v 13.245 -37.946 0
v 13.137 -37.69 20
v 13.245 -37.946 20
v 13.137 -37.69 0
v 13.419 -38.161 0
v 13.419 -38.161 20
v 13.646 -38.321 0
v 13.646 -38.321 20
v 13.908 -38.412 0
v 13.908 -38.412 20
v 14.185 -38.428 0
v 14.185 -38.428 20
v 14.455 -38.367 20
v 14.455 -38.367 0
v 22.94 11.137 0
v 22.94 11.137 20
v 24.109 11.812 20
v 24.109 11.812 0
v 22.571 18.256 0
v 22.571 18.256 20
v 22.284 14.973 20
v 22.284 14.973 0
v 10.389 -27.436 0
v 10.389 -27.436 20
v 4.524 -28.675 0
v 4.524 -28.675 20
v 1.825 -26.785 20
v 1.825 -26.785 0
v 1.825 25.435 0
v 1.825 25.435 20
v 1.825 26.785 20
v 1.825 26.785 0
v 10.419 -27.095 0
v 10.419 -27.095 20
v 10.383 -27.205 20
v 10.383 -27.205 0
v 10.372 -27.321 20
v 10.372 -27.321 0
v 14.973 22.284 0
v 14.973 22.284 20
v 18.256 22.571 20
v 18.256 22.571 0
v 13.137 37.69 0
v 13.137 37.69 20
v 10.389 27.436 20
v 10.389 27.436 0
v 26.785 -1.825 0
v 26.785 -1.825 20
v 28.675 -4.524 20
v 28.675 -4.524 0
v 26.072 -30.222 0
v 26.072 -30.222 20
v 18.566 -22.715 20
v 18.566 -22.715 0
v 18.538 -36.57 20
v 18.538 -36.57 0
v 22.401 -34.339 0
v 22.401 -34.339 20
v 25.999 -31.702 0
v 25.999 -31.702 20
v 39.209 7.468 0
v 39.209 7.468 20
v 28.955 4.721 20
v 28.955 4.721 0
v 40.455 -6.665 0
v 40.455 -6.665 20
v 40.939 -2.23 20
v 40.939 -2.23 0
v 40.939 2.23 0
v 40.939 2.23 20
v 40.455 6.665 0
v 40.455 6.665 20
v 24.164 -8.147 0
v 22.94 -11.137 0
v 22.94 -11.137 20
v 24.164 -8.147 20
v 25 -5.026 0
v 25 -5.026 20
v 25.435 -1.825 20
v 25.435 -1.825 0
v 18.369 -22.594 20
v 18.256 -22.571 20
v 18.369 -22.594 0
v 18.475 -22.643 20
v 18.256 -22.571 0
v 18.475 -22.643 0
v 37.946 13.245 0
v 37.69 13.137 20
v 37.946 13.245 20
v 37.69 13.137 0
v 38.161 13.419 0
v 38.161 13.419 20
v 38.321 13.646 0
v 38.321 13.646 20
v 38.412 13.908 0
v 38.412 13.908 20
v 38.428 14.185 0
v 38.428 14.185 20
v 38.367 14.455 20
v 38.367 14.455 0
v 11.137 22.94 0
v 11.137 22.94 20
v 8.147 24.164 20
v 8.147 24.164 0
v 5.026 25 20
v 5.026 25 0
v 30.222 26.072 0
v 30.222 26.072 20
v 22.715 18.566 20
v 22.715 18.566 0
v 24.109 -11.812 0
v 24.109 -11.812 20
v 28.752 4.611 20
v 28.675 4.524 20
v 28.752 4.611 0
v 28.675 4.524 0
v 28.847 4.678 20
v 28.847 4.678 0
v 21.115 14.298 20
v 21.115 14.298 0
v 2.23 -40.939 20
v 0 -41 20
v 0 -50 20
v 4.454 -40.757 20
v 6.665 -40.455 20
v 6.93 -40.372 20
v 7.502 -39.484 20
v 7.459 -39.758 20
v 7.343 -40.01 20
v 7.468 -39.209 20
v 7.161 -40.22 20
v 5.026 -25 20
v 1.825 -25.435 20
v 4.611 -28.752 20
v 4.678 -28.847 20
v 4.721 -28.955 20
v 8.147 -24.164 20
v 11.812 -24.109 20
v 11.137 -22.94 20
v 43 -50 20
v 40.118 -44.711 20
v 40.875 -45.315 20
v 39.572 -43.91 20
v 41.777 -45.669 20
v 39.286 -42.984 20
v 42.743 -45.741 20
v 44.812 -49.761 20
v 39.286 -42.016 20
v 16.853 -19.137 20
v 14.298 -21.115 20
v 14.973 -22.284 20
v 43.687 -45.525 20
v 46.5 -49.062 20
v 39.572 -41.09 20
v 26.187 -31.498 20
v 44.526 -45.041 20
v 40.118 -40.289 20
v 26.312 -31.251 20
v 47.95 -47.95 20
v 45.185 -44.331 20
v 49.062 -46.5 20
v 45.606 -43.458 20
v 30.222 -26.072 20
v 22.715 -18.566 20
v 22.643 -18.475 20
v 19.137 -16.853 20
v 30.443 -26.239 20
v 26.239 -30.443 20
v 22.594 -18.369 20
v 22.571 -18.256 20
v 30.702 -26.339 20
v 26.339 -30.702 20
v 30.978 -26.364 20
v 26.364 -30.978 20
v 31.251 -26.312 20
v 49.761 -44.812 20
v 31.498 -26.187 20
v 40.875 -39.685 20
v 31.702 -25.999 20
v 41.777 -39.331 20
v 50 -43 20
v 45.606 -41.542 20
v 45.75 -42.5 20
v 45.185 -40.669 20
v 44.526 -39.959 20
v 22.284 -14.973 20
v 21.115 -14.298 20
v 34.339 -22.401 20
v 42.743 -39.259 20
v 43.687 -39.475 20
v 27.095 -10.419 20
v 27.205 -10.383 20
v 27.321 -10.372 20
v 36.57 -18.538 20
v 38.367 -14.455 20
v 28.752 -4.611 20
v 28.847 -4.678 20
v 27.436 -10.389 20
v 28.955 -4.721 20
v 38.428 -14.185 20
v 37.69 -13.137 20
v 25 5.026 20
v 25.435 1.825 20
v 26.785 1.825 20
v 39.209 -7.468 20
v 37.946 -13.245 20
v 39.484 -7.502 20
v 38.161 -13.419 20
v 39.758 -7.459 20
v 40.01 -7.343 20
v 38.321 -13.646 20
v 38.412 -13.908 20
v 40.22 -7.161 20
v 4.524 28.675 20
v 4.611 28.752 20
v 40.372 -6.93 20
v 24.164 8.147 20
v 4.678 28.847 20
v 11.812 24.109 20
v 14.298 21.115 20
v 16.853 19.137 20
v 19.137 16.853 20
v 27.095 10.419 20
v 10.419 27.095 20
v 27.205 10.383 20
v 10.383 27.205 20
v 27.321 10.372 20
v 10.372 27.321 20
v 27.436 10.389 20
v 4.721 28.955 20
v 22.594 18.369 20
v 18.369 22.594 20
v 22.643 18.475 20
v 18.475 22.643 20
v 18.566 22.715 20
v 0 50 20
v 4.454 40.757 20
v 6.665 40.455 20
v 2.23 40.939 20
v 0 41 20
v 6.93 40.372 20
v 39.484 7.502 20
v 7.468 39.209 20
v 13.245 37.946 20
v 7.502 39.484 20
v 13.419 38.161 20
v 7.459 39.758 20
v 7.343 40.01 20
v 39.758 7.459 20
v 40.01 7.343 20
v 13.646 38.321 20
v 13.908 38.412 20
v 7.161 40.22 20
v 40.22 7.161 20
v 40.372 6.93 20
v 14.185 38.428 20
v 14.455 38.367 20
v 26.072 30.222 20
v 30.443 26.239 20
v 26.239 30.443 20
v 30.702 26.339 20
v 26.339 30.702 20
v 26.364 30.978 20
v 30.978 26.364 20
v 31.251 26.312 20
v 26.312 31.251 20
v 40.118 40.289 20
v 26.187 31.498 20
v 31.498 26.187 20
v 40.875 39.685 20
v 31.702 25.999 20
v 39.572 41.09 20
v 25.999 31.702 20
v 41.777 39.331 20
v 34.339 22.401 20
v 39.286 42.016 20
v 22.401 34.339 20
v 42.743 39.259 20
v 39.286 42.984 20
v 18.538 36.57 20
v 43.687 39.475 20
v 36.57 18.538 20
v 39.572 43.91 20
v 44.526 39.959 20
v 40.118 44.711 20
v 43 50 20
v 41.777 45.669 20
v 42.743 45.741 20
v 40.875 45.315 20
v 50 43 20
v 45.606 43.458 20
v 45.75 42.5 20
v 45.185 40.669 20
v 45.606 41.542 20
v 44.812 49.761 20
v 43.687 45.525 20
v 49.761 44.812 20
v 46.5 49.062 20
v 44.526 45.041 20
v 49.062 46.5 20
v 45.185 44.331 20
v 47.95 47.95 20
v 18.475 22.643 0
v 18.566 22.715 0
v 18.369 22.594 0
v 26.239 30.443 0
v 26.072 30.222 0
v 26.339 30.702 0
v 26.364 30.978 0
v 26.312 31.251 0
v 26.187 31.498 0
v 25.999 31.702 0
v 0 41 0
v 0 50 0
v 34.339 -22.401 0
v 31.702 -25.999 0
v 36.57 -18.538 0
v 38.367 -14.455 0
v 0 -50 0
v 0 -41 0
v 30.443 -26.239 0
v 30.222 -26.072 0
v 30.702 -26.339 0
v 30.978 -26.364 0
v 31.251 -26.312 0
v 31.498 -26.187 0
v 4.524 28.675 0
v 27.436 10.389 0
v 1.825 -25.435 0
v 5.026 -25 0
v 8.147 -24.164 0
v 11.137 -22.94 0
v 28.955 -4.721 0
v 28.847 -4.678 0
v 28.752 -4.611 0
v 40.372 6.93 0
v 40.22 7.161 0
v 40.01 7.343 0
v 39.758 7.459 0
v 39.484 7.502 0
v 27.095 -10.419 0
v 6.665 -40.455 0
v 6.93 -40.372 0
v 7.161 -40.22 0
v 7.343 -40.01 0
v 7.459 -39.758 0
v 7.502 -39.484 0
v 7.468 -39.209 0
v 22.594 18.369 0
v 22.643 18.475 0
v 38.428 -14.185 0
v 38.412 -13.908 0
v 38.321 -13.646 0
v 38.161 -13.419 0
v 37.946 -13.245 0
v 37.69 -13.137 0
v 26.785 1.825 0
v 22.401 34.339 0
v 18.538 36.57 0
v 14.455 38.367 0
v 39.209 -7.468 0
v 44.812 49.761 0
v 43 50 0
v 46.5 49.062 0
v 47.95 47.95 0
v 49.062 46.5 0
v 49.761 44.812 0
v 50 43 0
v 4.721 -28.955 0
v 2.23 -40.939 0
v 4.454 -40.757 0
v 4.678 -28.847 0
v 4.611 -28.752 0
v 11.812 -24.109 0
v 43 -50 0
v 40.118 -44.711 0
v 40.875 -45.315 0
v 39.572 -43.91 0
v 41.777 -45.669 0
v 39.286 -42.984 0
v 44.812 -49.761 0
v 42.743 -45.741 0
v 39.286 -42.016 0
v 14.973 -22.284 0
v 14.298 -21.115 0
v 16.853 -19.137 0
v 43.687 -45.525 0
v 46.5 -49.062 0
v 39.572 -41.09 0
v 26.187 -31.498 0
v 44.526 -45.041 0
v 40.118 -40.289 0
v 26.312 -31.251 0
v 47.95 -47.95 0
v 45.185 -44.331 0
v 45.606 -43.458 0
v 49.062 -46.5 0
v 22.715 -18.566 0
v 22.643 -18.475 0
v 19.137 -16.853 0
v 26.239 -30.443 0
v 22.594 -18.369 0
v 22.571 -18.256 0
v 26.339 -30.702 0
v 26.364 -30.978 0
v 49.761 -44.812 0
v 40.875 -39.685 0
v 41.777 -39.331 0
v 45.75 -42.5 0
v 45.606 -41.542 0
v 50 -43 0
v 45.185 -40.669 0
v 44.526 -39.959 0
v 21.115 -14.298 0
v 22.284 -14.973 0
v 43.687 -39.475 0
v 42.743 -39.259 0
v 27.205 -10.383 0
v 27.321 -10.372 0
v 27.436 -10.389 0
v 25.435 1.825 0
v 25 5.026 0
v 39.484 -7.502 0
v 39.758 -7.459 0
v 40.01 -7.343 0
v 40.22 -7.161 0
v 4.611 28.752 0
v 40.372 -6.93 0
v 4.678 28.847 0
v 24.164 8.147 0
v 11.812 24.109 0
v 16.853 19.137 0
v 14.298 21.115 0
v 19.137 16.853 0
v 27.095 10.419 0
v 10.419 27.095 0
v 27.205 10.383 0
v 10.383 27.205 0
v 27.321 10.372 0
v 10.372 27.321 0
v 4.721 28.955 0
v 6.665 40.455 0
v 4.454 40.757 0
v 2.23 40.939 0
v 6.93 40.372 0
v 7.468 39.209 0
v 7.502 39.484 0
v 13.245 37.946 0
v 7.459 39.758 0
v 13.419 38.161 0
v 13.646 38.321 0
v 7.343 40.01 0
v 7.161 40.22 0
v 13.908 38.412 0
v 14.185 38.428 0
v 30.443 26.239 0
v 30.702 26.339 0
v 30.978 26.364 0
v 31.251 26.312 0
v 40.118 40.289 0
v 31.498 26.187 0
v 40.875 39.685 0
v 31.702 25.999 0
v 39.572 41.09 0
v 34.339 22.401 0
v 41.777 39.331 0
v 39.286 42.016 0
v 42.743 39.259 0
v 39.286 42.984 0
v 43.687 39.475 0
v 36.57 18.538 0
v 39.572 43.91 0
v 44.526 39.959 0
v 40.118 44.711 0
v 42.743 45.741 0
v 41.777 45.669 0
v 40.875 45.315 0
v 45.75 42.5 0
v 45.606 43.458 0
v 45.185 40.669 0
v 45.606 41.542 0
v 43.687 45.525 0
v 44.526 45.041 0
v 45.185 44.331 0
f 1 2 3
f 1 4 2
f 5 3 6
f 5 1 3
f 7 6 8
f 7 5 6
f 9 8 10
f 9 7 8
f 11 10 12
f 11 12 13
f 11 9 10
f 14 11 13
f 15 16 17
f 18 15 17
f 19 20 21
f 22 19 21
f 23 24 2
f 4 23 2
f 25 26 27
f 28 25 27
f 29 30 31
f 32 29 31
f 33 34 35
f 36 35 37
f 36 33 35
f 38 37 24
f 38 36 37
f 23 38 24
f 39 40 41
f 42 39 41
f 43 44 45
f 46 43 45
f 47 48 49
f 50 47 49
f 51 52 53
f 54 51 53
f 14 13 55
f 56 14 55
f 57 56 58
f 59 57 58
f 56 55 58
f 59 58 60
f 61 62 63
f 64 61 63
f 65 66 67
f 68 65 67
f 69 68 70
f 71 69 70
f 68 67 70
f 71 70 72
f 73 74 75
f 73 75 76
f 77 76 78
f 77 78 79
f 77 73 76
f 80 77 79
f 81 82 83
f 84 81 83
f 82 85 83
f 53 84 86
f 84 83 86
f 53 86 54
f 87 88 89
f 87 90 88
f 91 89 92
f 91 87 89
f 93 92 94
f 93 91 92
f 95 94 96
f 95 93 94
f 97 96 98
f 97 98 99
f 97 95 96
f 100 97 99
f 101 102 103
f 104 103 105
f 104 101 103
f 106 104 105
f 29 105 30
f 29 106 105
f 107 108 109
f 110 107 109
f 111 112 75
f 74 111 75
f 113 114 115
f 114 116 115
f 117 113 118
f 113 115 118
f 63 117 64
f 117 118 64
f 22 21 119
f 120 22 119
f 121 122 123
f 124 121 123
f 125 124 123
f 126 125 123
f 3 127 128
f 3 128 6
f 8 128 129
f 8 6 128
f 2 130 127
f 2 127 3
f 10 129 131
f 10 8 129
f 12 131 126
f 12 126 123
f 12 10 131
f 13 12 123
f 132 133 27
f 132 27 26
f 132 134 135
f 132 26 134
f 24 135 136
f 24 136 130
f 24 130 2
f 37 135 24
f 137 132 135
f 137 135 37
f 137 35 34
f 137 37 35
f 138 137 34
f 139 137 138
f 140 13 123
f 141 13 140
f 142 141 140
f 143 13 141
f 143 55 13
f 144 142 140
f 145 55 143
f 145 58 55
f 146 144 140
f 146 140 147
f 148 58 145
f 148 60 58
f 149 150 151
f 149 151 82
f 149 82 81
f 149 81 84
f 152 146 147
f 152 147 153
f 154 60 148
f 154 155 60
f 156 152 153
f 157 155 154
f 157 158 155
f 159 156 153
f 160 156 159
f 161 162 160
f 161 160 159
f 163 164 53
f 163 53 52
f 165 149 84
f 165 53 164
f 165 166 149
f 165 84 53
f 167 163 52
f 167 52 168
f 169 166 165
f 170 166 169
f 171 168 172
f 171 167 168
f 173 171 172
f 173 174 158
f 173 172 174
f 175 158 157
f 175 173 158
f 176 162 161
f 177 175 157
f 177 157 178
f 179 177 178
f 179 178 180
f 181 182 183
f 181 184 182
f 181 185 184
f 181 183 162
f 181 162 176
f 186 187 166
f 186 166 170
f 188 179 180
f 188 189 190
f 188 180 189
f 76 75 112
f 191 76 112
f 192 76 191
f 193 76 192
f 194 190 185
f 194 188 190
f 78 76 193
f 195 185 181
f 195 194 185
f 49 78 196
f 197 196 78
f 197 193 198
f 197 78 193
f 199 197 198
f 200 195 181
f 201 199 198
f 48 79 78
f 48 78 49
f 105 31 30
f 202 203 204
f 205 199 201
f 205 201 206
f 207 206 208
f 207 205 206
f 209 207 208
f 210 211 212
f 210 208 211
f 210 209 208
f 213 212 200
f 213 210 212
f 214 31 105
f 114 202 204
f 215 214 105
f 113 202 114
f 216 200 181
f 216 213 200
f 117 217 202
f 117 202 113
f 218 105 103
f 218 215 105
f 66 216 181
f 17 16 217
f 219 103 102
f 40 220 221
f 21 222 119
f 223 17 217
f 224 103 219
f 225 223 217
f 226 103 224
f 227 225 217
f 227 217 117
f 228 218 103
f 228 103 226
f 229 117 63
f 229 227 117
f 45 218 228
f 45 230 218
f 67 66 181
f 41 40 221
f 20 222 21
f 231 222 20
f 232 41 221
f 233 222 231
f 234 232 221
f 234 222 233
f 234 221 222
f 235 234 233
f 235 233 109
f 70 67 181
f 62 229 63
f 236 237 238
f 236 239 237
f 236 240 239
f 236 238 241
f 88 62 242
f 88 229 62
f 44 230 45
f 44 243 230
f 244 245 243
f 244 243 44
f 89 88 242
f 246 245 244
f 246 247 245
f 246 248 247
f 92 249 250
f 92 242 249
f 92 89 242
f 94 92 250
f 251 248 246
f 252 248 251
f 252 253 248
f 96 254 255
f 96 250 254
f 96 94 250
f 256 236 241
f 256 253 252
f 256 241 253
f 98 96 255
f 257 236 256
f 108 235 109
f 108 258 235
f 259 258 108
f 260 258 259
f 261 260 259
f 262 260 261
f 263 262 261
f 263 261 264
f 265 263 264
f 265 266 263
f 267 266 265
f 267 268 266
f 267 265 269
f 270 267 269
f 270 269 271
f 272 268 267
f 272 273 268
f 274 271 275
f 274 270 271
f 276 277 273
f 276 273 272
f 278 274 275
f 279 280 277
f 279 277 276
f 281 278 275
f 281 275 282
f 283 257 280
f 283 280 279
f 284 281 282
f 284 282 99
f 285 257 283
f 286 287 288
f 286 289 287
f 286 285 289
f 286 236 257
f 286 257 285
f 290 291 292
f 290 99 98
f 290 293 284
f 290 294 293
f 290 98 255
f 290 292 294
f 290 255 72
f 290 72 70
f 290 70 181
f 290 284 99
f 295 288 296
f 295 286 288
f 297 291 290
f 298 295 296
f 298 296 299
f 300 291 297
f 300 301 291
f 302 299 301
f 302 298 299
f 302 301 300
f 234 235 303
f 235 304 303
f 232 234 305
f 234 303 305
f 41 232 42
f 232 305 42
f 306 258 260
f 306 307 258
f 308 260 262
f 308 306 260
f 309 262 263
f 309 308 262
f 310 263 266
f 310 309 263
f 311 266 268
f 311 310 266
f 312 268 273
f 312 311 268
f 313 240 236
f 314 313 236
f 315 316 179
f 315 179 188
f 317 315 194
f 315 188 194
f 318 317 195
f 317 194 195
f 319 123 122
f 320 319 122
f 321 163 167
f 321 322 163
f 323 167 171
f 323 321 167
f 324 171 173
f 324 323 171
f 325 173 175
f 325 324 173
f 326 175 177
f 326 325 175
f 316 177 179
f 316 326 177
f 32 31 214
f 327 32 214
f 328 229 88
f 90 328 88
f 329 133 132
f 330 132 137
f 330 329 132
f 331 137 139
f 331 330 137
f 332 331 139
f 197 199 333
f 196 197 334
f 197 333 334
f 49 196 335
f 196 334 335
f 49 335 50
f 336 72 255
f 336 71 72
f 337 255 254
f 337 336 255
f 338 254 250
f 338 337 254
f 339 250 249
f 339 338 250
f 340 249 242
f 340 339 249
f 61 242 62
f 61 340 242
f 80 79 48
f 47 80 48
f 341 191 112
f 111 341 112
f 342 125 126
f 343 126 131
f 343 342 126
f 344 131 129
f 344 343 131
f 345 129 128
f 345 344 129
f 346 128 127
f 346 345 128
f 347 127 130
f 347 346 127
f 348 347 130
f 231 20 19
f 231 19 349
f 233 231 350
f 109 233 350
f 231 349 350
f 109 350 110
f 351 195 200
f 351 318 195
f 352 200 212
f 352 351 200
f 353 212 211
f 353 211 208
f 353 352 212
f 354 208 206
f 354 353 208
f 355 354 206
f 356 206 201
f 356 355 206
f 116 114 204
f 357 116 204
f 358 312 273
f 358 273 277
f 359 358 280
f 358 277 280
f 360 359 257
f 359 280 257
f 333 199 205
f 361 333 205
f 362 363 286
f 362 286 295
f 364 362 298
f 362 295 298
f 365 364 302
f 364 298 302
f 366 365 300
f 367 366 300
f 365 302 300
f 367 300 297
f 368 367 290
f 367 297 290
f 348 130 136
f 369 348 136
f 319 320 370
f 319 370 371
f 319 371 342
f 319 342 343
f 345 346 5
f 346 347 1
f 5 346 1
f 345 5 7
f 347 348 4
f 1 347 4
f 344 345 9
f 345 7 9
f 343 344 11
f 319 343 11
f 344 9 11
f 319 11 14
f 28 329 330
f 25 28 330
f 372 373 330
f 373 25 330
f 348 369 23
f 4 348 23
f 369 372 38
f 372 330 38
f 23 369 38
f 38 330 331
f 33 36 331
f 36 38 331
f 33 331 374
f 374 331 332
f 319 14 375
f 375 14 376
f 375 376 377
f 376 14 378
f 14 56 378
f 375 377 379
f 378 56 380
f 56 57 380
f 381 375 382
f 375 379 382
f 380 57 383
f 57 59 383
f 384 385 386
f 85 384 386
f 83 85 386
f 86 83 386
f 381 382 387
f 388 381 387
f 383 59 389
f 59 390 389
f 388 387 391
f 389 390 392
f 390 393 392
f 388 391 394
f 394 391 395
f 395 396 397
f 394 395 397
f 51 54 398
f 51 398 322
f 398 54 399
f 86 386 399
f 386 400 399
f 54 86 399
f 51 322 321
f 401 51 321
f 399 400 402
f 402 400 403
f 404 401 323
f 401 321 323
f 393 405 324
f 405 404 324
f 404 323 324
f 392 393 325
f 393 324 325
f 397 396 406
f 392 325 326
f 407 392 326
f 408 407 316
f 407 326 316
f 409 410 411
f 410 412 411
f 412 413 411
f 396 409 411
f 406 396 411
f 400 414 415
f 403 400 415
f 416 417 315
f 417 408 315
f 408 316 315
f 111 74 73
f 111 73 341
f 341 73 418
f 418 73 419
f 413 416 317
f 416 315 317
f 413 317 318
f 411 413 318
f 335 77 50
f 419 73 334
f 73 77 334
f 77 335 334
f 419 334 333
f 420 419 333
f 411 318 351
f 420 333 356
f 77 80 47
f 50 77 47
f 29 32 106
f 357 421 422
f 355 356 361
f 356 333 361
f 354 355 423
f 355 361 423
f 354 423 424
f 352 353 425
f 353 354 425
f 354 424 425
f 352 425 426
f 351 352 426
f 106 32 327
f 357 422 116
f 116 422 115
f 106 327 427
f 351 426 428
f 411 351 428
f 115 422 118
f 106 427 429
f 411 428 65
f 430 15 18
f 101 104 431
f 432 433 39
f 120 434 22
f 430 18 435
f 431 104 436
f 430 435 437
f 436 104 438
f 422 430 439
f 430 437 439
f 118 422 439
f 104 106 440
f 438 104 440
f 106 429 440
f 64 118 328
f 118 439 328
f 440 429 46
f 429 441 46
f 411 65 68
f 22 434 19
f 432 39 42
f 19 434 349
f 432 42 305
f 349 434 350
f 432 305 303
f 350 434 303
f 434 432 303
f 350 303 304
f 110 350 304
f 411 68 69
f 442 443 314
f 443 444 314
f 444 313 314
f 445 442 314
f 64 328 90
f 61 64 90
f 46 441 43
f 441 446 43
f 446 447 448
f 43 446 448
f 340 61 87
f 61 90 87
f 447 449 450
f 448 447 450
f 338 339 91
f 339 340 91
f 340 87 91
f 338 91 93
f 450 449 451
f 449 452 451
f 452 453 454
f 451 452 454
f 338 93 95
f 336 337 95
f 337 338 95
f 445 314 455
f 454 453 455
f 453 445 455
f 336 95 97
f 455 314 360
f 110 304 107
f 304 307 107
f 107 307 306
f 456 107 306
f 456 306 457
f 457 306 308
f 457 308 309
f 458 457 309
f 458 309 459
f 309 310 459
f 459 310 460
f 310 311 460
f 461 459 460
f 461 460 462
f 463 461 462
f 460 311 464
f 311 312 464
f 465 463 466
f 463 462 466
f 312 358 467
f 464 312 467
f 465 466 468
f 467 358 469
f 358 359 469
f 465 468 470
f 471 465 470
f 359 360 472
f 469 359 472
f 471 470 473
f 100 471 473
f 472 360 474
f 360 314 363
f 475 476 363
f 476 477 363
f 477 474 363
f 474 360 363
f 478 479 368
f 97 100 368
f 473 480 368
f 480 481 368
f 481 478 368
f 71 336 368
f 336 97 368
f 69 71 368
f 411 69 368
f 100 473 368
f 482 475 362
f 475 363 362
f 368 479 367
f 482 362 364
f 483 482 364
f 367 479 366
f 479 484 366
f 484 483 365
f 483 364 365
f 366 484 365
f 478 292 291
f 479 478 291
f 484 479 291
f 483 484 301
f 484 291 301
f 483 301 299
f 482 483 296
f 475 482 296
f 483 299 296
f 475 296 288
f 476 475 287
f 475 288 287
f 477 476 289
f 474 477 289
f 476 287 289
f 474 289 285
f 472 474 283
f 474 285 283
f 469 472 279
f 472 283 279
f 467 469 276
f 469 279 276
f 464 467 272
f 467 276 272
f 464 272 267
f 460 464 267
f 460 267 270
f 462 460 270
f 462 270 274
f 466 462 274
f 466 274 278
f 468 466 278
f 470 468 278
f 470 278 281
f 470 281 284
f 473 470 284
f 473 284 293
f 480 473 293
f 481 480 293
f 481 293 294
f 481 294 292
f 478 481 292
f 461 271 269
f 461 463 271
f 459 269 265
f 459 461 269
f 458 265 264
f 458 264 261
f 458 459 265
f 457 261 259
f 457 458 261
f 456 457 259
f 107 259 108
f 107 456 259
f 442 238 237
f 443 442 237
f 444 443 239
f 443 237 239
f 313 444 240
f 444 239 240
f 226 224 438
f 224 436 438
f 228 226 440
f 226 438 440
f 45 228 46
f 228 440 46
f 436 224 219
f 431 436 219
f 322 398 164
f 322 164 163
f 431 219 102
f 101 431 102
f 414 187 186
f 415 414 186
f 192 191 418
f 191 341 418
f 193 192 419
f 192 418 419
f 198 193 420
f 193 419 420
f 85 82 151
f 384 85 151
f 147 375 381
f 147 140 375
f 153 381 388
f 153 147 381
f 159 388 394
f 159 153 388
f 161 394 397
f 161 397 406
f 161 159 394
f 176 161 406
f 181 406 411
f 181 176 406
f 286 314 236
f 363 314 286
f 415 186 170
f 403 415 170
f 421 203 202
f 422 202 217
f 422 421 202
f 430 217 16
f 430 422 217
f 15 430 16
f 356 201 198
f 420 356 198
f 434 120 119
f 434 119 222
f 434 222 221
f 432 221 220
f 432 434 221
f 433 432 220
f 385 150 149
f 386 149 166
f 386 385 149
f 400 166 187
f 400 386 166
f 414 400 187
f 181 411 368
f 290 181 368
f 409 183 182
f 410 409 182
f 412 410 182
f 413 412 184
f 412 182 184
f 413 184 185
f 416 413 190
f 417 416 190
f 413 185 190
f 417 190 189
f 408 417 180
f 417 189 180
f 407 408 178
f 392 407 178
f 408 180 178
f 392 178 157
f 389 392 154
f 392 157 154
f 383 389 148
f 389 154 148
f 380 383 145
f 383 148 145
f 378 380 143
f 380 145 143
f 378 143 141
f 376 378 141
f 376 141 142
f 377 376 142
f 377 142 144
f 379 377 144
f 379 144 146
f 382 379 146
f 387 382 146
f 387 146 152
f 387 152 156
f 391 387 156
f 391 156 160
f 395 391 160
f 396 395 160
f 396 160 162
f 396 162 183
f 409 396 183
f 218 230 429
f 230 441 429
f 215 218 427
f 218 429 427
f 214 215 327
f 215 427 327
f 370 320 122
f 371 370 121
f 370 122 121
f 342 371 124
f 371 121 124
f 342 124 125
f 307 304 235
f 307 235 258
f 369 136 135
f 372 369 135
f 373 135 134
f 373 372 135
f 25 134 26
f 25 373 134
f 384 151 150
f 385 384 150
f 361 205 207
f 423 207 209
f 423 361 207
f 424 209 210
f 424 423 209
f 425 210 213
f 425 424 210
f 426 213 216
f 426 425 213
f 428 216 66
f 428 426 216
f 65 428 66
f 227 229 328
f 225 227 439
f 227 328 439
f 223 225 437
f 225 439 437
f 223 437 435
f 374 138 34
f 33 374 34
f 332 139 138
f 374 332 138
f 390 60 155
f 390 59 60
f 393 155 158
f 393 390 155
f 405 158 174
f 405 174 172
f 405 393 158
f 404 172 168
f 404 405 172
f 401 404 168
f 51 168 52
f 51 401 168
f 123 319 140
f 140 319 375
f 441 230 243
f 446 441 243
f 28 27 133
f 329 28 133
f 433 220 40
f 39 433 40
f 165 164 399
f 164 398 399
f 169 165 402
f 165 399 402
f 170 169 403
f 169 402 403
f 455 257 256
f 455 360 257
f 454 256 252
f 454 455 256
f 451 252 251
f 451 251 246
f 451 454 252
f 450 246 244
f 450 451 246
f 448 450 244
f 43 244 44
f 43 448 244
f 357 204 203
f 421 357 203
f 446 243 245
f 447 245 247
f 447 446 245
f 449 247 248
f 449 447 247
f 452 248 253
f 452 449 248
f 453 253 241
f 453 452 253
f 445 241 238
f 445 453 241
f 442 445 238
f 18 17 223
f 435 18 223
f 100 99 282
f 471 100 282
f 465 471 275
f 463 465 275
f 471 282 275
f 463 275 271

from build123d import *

# Parameters (mm, degrees)
SKETCH1_W                              = 100
SKETCH1_H                              = 100
SKETCH1_R                              = 25.5
LAMINATION_EXTRUCTION_DEPTH            = 20
SLOT_CUT_DEPTH                         = 74.484692283
SLOT_FILLET_TOP_R                      = 1
SLOT_FILLET_BOTTOM_R                   = 0.5
SLOT_DUPLICATE_COUNT                   = 12
SLOT_FILLET_TOP_OF_SLOT_DUPLICATE_R    = 1
SLOT_FILLET_BOTTOM_OF_SLOT_DUPLICATE_R = 0.5
SKETCH3_R                              = 3.25
BOLT_HOLE_CUT_DEPTH                    = 74.484692283
CORNER_FILLET_R                        = 7
SKETCH4_W                              = 50
SKETCH4_H                              = 100
CUT_EXTRUDE1_DEPTH                     = 74.484692283


with BuildPart() as part:
    # Sketch1 → Lamination Extruction (new body)
    with BuildSketch(Plane.XY):
        Rectangle(SKETCH1_W, SKETCH1_H)
        Circle(SKETCH1_R, mode=Mode.SUBTRACT)
    extrude(amount=LAMINATION_EXTRUCTION_DEPTH)

    # Sketch2 → Slot Cut (cut, through all)
    with BuildSketch(Plane.XY.offset(20)):
        with BuildLine():
            Line((4.673479277, 28.779136449), (7.75, 40.260868098))
            ThreePointArc((7.75, 40.260868098), (0, 41), (-7.75, 40.260868098))
            Line((-7.75, 40.260868098), (-4.673479277, 28.779136449))
            Line((-4.673479277, 28.779136449), (-1.825, 26.784609787))
            Line((-1.825, 26.784609787), (-1.825, 25.434609787))
            ThreePointArc((-1.825, 25.434609787), (0, 25.5), (1.825, 25.434609787))
            Line((1.825, 25.434609787), (1.825, 26.784609787))
            Line((1.825, 26.784609787), (4.673479277, 28.779136449))
        make_face()
    slot_cut = extrude(amount=-SLOT_CUT_DEPTH, mode=Mode.SUBTRACT)

    # Slot Fillet Top
    slot_fillet_top_edges = [part.edges().sort_by_distance(p)[0] for p in [
        (-7.75, 40.260868098, 10),
        (7.75, 40.260868098, 10),
    ]]
    fillet(slot_fillet_top_edges, radius=SLOT_FILLET_TOP_R)

    # Slot Fillet Bottom
    slot_fillet_bottom_edges = [part.edges().sort_by_distance(p)[0] for p in [
        (4.673479277, 28.779136449, 10),
        (-4.673479277, 28.779136449, 10),
    ]]
    fillet(slot_fillet_bottom_edges, radius=SLOT_FILLET_BOTTOM_R)

    # Slot Duplicate: Slot Cut ×12 about axis
    slot_duplicate_axis = Axis((0, 0, 0), (0, 0, 1))
    for i in range(1, SLOT_DUPLICATE_COUNT):
        add(slot_cut.rotate(slot_duplicate_axis, i * 360 / SLOT_DUPLICATE_COUNT), mode=Mode.SUBTRACT)

    # Slot Fillet Top of Slot Duplicate
    slot_fillet_top_of_slot_duplicate_edges = [part.edges().sort_by_distance(p)[0] for p in [
        (-26.842130928, 30.991934551, 10),
        (-13.41873717, 38.741934551, 10),
        (-38.741934551, 13.41873717, 10),
        (-30.991934551, 26.842130928, 10),
        (-40.260868098, -7.75, 10),
        (-40.260868098, 7.75, 10),
        (-30.991934551, -26.842130928, 10),
        (-38.741934551, -13.41873717, 10),
        (-13.41873717, -38.741934551, 10),
        (-26.842130928, -30.991934551, 10),
        (7.75, -40.260868098, 10),
        (-7.75, -40.260868098, 10),
        (26.842130928, -30.991934551, 10),
        (13.41873717, -38.741934551, 10),
        (38.741934551, -13.41873717, 10),
        (30.991934551, -26.842130928, 10),
        (40.260868098, 7.75, 10),
        (40.260868098, -7.75, 10),
        (30.991934551, 26.842130928, 10),
        (38.741934551, 13.41873717, 10),
        (13.41873717, 38.741934551, 10),
        (26.842130928, 30.991934551, 10),
    ]]
    fillet(slot_fillet_top_of_slot_duplicate_edges, radius=SLOT_FILLET_TOP_OF_SLOT_DUPLICATE_R)

    # Slot Fillet Bottom of Slot Duplicate
    slot_fillet_bottom_of_slot_duplicate_edges = [part.edges().sort_by_distance(p)[0] for p in [
        (-10.342216447, 27.260202902, 10),
        (-18.436920002, 22.586723625, 10),
        (-22.586723625, 18.436920002, 10),
        (-27.260202902, 10.342216447, 10),
        (-28.779136449, 4.673479277, 10),
        (-28.779136449, -4.673479277, 10),
        (-27.260202902, -10.342216447, 10),
        (-22.586723625, -18.436920002, 10),
        (-18.436920002, -22.586723625, 10),
        (-10.342216447, -27.260202902, 10),
        (-4.673479277, -28.779136449, 10),
        (4.673479277, -28.779136449, 10),
        (10.342216447, -27.260202902, 10),
        (18.436920002, -22.586723625, 10),
        (22.586723625, -18.436920002, 10),
        (27.260202902, -10.342216447, 10),
        (28.779136449, -4.673479277, 10),
        (28.779136449, 4.673479277, 10),
        (27.260202902, 10.342216447, 10),
        (22.586723625, 18.436920002, 10),
        (18.436920002, 22.586723625, 10),
        (10.342216447, 27.260202902, 10),
    ]]
    fillet(slot_fillet_bottom_of_slot_duplicate_edges, radius=SLOT_FILLET_BOTTOM_OF_SLOT_DUPLICATE_R)

    # Sketch3 → Bolt Hole Cut (cut, through all)
    with BuildSketch(Plane.XY.offset(20)):
        with Locations((-42.5, 42.5)):
            Circle(SKETCH3_R)
        with Locations((42.5, 42.5)):
            Circle(SKETCH3_R)
        with Locations((42.5, -42.5)):
            Circle(SKETCH3_R)
        with Locations((-42.5, -42.5)):
            Circle(SKETCH3_R)
    extrude(amount=-BOLT_HOLE_CUT_DEPTH, mode=Mode.SUBTRACT)

    # Corner Fillet
    corner_fillet_edges = [part.edges().sort_by_distance(p)[0] for p in [
        (-50, 50, 10),
        (50, 50, 10),
        (50, -50, 10),
        (-50, -50, 10),
    ]]
    fillet(corner_fillet_edges, radius=CORNER_FILLET_R)

    # Sketch4 → Cut-Extrude1 (cut, through all)
    with BuildSketch(Plane.XY.offset(20)):
        with Locations((-25, 0)):
            Rectangle(SKETCH4_W, SKETCH4_H)
    extrude(amount=-CUT_EXTRUDE1_DEPTH, mode=Mode.SUBTRACT)


solid = part.part
